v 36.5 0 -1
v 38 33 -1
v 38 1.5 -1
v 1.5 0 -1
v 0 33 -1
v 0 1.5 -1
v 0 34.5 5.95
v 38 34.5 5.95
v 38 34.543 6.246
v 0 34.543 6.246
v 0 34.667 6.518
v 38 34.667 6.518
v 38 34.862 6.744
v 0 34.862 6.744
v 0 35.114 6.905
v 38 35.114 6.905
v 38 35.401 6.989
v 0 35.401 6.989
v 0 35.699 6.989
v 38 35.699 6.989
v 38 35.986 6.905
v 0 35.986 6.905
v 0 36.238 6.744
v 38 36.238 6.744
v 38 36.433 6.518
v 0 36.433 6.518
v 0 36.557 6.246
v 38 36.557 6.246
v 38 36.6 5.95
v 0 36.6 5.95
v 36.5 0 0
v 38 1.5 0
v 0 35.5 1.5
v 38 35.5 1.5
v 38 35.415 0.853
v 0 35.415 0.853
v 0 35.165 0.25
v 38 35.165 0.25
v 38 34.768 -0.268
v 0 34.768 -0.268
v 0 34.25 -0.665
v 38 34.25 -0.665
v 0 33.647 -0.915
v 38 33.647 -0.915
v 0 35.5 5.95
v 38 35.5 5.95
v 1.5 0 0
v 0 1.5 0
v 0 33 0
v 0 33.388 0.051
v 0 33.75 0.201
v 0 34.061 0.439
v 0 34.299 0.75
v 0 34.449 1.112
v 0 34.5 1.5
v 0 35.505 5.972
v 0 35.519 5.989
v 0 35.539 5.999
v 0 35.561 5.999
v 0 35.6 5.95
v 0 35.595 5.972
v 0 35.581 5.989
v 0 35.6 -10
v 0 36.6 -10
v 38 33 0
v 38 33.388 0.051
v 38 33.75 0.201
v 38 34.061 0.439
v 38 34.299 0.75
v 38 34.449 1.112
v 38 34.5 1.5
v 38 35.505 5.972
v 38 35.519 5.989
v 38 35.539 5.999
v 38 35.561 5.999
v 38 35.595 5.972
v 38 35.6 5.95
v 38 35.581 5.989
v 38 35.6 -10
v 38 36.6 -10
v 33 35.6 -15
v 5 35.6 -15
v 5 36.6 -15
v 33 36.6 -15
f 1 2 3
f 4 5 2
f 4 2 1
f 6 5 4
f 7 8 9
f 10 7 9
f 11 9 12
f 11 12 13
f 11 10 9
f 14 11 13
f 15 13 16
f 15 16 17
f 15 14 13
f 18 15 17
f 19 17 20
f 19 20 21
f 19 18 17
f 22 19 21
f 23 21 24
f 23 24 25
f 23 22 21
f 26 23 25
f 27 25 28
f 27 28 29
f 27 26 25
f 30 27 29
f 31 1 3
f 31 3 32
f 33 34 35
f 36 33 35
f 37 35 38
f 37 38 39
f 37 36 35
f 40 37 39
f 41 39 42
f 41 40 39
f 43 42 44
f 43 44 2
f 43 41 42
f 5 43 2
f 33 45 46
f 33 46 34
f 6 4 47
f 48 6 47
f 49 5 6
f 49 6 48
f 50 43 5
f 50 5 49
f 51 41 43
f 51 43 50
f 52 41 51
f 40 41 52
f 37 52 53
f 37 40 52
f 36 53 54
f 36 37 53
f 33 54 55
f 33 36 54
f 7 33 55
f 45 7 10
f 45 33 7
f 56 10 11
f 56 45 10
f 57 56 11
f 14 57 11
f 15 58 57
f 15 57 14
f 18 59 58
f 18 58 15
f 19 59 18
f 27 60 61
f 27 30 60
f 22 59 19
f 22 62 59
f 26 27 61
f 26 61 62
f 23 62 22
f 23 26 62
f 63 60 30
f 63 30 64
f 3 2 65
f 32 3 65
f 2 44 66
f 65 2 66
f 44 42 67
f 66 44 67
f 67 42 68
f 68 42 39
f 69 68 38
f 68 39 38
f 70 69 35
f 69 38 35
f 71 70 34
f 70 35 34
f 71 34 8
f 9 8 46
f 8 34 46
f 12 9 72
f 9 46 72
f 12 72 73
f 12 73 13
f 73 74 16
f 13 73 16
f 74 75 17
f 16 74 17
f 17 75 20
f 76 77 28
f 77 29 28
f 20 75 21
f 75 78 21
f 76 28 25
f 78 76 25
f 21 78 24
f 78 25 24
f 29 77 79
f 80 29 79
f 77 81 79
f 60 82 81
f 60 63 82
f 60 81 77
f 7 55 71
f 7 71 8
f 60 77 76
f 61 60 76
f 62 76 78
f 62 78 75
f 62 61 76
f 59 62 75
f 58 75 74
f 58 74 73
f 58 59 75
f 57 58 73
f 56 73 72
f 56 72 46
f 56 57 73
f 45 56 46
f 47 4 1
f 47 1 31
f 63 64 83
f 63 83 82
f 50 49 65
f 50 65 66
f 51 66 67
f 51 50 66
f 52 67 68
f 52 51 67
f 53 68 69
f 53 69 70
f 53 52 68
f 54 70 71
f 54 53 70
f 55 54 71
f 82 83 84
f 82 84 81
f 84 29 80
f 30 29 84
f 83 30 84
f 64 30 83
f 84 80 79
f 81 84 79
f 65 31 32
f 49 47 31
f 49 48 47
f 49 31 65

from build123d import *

# Parameters (mm, degrees)
BOSS_EXTRUDE1_DEPTH = 38
CHAMFER1_SIZE       = 5
CHAMFER2_SIZE       = 1.5


with BuildPart() as part:
    # Sketch1 → Boss-Extrude1 (new body)
    with BuildSketch(Plane(origin=(0, 0, 0), x_dir=(0, 0, -1), z_dir=(1, 0, 0))):
        with BuildLine():
            Line((0, 0), (0, 33))
            ThreePointArc((0, 33), (-0.439339828, 34.060660172), (-1.5, 34.5))
            Line((-1.5, 34.5), (-5.95, 34.5))
            ThreePointArc((-5.95, 34.5), (-7, 35.55), (-5.95, 36.6))
            Line((-5.95, 36.6), (15, 36.6))
            Line((15, 36.6), (15, 35.6))
            Line((15, 35.6), (-5.95, 35.6))
            ThreePointArc((-5.95, 35.6), (-6, 35.55), (-5.95, 35.5))
            Line((-5.95, 35.5), (-1.5, 35.5))
            ThreePointArc((-1.5, 35.5), (0.267766953, 34.767766953), (1, 33))
            Line((1, 33), (1, 0))
            Line((1, 0), (0, 0))
        make_face()
    extrude(amount=BOSS_EXTRUDE1_DEPTH)

    # Chamfer1
    chamfer1_edges = [part.edges().sort_by_distance(p)[0] for p in [
        (0, 36.1, -15),
        (38, 36.1, -15),
    ]]
    chamfer(chamfer1_edges, length=CHAMFER1_SIZE)

    # Chamfer2
    chamfer2_edges = [part.edges().sort_by_distance(p)[0] for p in [
        (0, 0, -0.5),
        (38, 0, -0.5),
    ]]
    chamfer(chamfer2_edges, length=CHAMFER2_SIZE)


solid = part.part
